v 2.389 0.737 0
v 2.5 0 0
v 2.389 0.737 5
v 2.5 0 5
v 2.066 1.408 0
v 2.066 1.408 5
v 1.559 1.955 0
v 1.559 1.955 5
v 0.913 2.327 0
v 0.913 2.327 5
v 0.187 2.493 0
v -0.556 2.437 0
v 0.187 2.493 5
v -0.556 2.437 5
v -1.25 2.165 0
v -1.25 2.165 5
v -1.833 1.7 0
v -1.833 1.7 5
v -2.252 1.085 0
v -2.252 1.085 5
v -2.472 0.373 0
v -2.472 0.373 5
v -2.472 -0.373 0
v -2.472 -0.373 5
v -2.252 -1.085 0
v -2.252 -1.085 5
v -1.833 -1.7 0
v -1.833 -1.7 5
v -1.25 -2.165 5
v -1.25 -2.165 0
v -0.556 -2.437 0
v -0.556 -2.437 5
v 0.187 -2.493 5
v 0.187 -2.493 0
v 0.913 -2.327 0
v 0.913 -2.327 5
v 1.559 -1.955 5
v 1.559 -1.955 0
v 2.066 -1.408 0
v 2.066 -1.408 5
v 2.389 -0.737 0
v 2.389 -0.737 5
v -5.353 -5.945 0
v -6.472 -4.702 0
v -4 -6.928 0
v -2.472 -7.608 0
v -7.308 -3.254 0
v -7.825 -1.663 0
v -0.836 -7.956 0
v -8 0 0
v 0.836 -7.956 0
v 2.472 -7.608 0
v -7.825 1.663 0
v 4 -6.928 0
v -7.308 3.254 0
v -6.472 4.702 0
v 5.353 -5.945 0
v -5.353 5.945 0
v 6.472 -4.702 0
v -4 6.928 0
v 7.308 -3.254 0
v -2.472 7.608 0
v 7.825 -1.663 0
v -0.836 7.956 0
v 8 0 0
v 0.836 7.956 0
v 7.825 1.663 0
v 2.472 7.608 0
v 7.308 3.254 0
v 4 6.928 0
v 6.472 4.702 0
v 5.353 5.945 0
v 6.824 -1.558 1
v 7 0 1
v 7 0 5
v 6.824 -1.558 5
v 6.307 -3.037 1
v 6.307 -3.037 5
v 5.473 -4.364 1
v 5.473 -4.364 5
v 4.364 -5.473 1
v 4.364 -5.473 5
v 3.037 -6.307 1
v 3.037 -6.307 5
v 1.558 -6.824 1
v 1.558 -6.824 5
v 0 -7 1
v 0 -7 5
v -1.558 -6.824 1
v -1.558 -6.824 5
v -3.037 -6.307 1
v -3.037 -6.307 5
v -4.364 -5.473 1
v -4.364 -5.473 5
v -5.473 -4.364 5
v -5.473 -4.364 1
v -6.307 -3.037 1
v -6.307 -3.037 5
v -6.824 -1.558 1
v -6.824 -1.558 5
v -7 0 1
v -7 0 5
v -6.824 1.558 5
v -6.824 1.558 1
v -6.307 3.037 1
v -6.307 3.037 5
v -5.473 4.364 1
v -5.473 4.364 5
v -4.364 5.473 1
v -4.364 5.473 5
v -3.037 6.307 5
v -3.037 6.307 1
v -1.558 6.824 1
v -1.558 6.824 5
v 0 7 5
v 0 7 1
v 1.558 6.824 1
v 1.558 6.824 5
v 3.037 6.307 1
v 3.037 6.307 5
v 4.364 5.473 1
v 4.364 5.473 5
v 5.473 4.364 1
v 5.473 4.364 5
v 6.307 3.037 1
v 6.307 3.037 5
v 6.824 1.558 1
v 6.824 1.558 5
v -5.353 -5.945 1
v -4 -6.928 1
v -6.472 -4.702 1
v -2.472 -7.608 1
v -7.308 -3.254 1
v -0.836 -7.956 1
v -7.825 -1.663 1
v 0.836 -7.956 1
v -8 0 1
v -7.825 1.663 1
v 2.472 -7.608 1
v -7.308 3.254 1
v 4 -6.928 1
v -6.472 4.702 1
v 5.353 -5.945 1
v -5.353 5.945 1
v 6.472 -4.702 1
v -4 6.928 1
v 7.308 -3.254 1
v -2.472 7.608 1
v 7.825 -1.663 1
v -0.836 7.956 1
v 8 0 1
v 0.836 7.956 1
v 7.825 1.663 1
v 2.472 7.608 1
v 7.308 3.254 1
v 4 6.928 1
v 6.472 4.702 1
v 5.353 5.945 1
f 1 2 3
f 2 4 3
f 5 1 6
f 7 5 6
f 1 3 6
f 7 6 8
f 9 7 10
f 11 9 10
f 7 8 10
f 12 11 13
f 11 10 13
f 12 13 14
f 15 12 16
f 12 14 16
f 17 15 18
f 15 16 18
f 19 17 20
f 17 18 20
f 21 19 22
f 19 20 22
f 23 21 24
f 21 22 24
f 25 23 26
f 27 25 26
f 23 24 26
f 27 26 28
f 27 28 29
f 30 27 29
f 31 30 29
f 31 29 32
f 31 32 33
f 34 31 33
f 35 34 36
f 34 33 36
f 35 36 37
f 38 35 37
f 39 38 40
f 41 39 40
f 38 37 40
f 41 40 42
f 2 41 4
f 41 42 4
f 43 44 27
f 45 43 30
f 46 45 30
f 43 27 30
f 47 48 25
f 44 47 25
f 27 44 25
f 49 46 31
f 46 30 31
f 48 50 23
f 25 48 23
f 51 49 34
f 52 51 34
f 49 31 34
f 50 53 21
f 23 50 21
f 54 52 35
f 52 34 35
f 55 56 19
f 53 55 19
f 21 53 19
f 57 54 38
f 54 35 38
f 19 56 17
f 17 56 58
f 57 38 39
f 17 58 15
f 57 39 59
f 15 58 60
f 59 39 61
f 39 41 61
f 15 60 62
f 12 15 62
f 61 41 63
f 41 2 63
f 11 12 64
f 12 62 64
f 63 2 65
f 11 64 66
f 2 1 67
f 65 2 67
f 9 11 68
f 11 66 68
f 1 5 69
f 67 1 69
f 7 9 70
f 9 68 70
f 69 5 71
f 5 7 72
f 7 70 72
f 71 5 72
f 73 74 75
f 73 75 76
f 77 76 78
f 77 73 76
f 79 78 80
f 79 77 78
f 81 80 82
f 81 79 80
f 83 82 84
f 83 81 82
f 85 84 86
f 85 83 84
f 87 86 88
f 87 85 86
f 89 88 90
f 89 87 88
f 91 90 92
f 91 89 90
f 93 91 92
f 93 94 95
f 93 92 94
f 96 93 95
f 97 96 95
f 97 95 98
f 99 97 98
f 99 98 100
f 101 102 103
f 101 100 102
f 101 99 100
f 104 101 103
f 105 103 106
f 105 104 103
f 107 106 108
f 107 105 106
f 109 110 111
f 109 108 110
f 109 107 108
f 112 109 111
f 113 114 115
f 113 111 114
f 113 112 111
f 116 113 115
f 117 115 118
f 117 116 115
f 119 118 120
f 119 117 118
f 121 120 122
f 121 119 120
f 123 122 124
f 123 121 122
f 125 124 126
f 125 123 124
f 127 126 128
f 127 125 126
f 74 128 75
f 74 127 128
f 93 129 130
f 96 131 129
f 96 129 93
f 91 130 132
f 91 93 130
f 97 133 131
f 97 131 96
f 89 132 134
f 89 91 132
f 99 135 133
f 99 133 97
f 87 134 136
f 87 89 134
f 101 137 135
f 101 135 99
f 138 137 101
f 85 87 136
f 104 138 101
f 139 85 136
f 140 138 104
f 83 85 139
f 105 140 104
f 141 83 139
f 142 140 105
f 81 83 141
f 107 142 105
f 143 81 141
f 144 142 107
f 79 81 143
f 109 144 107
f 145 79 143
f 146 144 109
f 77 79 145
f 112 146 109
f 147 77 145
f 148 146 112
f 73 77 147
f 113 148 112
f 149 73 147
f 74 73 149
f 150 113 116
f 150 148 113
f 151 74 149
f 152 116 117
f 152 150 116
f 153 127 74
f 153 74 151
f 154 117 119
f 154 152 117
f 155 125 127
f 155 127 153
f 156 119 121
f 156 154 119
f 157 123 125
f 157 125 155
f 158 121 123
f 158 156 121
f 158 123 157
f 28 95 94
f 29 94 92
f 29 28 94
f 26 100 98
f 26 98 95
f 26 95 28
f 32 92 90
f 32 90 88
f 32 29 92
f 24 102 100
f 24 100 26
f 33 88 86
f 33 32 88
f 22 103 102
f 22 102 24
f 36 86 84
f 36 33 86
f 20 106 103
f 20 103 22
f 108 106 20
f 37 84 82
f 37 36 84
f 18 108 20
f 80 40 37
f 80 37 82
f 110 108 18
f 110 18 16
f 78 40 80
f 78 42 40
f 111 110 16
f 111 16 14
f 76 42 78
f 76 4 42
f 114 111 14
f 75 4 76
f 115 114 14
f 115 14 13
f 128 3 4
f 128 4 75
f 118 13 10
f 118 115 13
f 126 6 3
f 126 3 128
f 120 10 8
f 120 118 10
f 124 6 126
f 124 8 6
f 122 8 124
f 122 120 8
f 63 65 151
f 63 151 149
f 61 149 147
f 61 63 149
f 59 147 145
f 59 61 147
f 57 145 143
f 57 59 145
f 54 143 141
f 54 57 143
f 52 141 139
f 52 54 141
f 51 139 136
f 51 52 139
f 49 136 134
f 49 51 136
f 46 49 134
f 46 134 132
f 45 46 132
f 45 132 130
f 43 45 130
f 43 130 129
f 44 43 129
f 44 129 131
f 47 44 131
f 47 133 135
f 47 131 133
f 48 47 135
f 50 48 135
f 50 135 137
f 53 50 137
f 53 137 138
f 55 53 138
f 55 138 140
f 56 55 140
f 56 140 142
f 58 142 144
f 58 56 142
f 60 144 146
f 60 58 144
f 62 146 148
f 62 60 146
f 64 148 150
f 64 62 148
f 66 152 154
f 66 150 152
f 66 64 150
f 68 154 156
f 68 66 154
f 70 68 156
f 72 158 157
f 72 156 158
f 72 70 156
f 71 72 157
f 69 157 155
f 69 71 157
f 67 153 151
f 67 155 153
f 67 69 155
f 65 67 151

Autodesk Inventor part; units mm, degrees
ref_plane "YZ Plane" through (0, 0, 0) normal (1, 0, 0) x (0, 1, 0)
ref_plane "XZ Plane" through (0, 0, 0) normal (0, 1, 0) x (-1, 0, 0)
ref_plane "XY Plane" through (0, 0, 0) normal (0, 0, 1) x (1, 0, 0)
sketch "Sketch1" plane through (0, 0, 0) normal (0, 0, 1) x (1, 0, 0)
  circle A0 centre (0, 0) radius 8
  dimension "d0" = 16
extrude "Extrusion1" add sketch "Sketch1" along normal blind 1
sketch "Sketch2" plane through (0, 0, 1) normal (0, 0, 1) x (1, 0, 0)
  circle A0 centre (0, 0) radius 8 projected
  circle A1 centre (0, 0) radius 7
  dimension "d4" = 14
extrude "Extrusion2" add sketch "Sketch2" along normal blind 4 contours A1
sketch "Sketch3" plane through (0, 0, 5) normal (0, 0, 1) x (1, 0, 0)
  circle A0 centre (0, 0) radius 7 projected
  circle A1 centre (0, 0) radius 2.5
  dimension "d8" = 5
extrude "Extrusion3" cut sketch "Sketch3" against normal through all contours A1
properties part number "f605zz"
